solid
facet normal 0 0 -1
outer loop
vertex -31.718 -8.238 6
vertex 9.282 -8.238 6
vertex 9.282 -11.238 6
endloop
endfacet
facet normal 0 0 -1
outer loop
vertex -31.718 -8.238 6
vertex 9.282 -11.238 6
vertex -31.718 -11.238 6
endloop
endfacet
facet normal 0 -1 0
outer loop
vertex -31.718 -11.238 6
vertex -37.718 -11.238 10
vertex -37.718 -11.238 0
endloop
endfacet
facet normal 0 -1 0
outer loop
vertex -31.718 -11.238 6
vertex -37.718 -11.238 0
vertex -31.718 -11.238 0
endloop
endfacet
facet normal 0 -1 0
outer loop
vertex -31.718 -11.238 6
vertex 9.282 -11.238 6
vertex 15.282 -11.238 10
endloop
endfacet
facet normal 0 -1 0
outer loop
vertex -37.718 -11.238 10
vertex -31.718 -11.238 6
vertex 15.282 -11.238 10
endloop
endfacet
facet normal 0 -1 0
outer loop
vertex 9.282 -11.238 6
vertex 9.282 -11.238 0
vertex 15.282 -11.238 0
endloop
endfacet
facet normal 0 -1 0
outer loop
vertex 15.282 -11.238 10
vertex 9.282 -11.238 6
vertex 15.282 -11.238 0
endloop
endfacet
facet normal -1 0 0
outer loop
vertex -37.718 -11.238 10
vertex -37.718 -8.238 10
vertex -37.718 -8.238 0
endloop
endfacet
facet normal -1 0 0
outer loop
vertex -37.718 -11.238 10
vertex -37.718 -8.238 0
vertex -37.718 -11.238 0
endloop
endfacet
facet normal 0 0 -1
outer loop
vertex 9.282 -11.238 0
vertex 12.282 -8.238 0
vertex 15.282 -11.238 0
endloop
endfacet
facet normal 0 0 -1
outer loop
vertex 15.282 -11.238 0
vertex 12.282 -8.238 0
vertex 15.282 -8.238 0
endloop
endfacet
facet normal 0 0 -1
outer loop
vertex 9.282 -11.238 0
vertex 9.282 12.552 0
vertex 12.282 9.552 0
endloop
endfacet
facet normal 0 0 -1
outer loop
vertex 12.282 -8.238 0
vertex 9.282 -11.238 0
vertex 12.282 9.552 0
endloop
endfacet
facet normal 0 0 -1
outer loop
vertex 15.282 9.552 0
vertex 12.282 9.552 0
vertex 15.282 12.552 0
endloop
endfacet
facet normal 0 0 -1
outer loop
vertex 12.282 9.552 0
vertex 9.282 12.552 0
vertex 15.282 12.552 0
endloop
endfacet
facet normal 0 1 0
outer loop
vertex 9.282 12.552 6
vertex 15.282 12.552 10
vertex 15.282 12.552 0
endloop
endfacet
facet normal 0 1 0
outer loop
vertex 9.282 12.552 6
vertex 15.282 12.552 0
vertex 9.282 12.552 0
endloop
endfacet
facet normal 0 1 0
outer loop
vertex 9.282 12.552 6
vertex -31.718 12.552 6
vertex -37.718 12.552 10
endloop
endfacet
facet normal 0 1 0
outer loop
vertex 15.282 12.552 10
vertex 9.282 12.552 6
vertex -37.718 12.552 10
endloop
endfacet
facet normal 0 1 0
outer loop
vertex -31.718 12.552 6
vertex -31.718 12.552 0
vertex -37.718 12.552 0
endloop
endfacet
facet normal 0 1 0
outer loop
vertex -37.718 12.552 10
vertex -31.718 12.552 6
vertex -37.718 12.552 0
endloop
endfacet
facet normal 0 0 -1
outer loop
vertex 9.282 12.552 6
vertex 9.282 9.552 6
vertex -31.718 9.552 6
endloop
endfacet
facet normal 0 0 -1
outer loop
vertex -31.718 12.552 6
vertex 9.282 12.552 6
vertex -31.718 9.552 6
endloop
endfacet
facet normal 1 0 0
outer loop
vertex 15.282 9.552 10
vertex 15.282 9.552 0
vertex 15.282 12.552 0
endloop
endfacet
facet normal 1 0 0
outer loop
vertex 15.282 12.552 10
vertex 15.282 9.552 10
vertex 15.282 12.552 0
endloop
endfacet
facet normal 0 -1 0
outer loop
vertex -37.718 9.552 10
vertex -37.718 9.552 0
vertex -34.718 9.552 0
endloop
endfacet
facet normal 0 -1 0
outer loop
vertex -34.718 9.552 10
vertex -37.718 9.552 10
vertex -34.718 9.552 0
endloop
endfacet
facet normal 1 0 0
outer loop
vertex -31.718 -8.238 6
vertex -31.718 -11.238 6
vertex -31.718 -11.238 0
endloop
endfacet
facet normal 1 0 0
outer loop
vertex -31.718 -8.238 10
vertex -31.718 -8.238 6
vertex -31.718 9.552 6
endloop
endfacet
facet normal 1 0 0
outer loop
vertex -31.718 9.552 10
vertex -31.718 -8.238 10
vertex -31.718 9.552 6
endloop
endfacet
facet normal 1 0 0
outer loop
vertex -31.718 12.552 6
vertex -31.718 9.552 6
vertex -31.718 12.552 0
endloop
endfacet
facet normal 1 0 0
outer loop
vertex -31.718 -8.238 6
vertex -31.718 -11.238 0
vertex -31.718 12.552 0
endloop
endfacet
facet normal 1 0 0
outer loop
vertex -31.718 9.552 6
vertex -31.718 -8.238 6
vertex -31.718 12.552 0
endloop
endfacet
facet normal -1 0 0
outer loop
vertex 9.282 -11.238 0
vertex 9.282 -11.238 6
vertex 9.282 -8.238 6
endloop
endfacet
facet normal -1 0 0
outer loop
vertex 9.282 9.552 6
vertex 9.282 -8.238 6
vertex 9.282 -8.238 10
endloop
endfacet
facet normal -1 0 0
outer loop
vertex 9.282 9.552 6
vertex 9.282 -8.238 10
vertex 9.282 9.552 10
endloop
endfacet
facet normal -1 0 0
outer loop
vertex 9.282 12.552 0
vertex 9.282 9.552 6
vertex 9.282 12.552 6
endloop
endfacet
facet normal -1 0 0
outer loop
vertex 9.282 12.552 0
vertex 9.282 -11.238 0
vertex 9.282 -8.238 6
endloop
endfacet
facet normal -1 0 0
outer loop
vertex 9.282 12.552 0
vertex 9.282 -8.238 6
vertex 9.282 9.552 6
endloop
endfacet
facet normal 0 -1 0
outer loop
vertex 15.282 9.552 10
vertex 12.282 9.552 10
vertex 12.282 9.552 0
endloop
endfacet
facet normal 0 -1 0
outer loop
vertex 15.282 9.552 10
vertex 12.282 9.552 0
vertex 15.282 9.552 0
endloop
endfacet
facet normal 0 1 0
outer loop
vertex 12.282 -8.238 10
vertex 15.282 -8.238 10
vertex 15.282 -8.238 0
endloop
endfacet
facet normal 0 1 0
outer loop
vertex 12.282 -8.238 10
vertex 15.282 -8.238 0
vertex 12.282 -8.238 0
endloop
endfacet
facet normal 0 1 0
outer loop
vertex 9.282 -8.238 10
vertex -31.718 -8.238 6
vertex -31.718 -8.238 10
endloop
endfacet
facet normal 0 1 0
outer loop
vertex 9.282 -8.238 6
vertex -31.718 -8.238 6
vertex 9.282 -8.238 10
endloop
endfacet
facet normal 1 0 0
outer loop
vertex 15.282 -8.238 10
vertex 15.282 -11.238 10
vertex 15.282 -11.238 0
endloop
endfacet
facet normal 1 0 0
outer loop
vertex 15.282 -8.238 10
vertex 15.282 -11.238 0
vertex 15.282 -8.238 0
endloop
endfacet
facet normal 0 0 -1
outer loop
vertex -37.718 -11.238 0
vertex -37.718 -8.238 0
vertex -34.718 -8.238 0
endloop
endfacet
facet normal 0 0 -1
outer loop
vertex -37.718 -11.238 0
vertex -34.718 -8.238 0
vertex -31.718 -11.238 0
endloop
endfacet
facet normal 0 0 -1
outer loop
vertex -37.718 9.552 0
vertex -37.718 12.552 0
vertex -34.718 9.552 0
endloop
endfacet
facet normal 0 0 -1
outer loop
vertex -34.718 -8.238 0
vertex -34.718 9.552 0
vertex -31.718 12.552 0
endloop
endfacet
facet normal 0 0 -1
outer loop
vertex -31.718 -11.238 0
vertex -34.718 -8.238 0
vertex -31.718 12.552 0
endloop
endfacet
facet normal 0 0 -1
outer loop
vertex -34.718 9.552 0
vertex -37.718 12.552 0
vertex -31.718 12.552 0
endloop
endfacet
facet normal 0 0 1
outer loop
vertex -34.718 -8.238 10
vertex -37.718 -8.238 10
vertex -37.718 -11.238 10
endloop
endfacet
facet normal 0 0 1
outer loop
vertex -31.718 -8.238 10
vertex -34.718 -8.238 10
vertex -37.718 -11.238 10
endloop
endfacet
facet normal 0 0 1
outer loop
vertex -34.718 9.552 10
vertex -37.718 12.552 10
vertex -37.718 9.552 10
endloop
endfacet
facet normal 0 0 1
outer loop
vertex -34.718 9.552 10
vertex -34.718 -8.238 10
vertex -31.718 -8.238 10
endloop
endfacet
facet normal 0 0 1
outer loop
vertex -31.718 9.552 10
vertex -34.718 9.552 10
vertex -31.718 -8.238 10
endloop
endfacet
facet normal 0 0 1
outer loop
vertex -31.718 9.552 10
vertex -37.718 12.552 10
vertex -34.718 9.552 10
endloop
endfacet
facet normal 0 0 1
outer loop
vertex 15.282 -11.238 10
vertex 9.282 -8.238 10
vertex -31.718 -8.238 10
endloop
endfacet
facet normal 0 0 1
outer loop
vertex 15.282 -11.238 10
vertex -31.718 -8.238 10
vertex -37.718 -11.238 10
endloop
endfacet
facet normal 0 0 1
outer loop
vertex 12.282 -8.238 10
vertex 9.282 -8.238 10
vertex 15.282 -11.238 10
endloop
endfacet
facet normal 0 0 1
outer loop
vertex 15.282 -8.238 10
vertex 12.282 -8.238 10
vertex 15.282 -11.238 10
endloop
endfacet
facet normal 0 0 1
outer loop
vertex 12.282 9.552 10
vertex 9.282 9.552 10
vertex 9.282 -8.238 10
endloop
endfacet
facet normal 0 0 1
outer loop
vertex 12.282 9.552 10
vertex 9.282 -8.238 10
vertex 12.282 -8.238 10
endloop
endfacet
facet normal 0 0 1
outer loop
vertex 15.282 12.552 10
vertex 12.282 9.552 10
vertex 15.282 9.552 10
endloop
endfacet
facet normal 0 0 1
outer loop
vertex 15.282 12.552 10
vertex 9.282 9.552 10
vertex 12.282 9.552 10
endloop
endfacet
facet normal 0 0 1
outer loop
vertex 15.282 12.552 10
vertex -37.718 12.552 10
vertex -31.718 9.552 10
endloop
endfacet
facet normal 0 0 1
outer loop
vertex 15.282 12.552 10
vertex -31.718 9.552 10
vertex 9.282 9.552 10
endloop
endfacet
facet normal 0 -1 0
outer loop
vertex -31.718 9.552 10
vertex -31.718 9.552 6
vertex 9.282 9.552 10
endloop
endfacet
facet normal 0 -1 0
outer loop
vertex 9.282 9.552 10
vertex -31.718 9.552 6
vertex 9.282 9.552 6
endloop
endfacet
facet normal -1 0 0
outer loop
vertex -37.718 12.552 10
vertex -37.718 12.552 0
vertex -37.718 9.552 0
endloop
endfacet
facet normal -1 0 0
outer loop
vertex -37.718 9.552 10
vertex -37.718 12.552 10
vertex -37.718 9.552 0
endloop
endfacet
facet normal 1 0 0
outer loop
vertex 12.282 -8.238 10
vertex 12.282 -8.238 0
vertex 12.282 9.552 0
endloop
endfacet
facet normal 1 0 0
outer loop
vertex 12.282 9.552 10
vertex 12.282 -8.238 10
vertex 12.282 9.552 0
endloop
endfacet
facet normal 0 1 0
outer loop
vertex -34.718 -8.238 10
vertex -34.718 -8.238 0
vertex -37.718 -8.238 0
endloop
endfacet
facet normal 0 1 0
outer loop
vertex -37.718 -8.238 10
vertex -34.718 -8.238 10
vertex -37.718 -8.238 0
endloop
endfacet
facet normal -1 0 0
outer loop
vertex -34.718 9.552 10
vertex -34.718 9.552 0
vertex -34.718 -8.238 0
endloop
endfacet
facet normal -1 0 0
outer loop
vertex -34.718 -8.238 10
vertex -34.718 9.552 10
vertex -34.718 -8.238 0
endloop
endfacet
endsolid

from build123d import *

# Parameters (mm, degrees)
SKETCH1_W           = 41
SKETCH1_H           = 17.79
BOSS_EXTRUDE1_DEPTH = 10
SKETCH10_W          = 41
SKETCH10_H          = 3
CUT_EXTRUDE1_DEPTH  = 6


with BuildPart() as part:
    # Sketch1 → Boss-Extrude1 (new body)
    with BuildSketch(Plane.XY):
        Polygon((12.281684518, 9.551958914), (15.281684518, 9.551958914), (15.281684518, 12.551958914), (-37.718315482, 12.551958914), (-37.718315482, 9.551958914), (-34.718315482, 9.551958914), (-34.718315482, -8.238041086), (-37.718315482, -8.238041086), (-37.718315482, -11.238041086), (15.281684518, -11.238041086), (15.281684518, -8.238041086), (12.281684518, -8.238041086), align=None)
        with Locations((-11.218315482, 0.656958914)):
            Rectangle(SKETCH1_W, SKETCH1_H, mode=Mode.SUBTRACT)
    extrude(amount=BOSS_EXTRUDE1_DEPTH)

    # Sketch10 → Cut-Extrude1 (cut)
    with BuildSketch(Plane(origin=(0, 0, 0), x_dir=(-1, 0, 0), z_dir=(0, 0, -1))):
        with Locations((11.218315482, -9.738041086)):
            Rectangle(SKETCH10_W, SKETCH10_H)
    cut_extrude1 = extrude(amount=-CUT_EXTRUDE1_DEPTH, mode=Mode.SUBTRACT)

    # Mirror3: Cut-Extrude1 across plane
    add(cut_extrude1.mirror(Plane.ZX.offset(0.656958914)), mode=Mode.SUBTRACT)


solid = part.part
